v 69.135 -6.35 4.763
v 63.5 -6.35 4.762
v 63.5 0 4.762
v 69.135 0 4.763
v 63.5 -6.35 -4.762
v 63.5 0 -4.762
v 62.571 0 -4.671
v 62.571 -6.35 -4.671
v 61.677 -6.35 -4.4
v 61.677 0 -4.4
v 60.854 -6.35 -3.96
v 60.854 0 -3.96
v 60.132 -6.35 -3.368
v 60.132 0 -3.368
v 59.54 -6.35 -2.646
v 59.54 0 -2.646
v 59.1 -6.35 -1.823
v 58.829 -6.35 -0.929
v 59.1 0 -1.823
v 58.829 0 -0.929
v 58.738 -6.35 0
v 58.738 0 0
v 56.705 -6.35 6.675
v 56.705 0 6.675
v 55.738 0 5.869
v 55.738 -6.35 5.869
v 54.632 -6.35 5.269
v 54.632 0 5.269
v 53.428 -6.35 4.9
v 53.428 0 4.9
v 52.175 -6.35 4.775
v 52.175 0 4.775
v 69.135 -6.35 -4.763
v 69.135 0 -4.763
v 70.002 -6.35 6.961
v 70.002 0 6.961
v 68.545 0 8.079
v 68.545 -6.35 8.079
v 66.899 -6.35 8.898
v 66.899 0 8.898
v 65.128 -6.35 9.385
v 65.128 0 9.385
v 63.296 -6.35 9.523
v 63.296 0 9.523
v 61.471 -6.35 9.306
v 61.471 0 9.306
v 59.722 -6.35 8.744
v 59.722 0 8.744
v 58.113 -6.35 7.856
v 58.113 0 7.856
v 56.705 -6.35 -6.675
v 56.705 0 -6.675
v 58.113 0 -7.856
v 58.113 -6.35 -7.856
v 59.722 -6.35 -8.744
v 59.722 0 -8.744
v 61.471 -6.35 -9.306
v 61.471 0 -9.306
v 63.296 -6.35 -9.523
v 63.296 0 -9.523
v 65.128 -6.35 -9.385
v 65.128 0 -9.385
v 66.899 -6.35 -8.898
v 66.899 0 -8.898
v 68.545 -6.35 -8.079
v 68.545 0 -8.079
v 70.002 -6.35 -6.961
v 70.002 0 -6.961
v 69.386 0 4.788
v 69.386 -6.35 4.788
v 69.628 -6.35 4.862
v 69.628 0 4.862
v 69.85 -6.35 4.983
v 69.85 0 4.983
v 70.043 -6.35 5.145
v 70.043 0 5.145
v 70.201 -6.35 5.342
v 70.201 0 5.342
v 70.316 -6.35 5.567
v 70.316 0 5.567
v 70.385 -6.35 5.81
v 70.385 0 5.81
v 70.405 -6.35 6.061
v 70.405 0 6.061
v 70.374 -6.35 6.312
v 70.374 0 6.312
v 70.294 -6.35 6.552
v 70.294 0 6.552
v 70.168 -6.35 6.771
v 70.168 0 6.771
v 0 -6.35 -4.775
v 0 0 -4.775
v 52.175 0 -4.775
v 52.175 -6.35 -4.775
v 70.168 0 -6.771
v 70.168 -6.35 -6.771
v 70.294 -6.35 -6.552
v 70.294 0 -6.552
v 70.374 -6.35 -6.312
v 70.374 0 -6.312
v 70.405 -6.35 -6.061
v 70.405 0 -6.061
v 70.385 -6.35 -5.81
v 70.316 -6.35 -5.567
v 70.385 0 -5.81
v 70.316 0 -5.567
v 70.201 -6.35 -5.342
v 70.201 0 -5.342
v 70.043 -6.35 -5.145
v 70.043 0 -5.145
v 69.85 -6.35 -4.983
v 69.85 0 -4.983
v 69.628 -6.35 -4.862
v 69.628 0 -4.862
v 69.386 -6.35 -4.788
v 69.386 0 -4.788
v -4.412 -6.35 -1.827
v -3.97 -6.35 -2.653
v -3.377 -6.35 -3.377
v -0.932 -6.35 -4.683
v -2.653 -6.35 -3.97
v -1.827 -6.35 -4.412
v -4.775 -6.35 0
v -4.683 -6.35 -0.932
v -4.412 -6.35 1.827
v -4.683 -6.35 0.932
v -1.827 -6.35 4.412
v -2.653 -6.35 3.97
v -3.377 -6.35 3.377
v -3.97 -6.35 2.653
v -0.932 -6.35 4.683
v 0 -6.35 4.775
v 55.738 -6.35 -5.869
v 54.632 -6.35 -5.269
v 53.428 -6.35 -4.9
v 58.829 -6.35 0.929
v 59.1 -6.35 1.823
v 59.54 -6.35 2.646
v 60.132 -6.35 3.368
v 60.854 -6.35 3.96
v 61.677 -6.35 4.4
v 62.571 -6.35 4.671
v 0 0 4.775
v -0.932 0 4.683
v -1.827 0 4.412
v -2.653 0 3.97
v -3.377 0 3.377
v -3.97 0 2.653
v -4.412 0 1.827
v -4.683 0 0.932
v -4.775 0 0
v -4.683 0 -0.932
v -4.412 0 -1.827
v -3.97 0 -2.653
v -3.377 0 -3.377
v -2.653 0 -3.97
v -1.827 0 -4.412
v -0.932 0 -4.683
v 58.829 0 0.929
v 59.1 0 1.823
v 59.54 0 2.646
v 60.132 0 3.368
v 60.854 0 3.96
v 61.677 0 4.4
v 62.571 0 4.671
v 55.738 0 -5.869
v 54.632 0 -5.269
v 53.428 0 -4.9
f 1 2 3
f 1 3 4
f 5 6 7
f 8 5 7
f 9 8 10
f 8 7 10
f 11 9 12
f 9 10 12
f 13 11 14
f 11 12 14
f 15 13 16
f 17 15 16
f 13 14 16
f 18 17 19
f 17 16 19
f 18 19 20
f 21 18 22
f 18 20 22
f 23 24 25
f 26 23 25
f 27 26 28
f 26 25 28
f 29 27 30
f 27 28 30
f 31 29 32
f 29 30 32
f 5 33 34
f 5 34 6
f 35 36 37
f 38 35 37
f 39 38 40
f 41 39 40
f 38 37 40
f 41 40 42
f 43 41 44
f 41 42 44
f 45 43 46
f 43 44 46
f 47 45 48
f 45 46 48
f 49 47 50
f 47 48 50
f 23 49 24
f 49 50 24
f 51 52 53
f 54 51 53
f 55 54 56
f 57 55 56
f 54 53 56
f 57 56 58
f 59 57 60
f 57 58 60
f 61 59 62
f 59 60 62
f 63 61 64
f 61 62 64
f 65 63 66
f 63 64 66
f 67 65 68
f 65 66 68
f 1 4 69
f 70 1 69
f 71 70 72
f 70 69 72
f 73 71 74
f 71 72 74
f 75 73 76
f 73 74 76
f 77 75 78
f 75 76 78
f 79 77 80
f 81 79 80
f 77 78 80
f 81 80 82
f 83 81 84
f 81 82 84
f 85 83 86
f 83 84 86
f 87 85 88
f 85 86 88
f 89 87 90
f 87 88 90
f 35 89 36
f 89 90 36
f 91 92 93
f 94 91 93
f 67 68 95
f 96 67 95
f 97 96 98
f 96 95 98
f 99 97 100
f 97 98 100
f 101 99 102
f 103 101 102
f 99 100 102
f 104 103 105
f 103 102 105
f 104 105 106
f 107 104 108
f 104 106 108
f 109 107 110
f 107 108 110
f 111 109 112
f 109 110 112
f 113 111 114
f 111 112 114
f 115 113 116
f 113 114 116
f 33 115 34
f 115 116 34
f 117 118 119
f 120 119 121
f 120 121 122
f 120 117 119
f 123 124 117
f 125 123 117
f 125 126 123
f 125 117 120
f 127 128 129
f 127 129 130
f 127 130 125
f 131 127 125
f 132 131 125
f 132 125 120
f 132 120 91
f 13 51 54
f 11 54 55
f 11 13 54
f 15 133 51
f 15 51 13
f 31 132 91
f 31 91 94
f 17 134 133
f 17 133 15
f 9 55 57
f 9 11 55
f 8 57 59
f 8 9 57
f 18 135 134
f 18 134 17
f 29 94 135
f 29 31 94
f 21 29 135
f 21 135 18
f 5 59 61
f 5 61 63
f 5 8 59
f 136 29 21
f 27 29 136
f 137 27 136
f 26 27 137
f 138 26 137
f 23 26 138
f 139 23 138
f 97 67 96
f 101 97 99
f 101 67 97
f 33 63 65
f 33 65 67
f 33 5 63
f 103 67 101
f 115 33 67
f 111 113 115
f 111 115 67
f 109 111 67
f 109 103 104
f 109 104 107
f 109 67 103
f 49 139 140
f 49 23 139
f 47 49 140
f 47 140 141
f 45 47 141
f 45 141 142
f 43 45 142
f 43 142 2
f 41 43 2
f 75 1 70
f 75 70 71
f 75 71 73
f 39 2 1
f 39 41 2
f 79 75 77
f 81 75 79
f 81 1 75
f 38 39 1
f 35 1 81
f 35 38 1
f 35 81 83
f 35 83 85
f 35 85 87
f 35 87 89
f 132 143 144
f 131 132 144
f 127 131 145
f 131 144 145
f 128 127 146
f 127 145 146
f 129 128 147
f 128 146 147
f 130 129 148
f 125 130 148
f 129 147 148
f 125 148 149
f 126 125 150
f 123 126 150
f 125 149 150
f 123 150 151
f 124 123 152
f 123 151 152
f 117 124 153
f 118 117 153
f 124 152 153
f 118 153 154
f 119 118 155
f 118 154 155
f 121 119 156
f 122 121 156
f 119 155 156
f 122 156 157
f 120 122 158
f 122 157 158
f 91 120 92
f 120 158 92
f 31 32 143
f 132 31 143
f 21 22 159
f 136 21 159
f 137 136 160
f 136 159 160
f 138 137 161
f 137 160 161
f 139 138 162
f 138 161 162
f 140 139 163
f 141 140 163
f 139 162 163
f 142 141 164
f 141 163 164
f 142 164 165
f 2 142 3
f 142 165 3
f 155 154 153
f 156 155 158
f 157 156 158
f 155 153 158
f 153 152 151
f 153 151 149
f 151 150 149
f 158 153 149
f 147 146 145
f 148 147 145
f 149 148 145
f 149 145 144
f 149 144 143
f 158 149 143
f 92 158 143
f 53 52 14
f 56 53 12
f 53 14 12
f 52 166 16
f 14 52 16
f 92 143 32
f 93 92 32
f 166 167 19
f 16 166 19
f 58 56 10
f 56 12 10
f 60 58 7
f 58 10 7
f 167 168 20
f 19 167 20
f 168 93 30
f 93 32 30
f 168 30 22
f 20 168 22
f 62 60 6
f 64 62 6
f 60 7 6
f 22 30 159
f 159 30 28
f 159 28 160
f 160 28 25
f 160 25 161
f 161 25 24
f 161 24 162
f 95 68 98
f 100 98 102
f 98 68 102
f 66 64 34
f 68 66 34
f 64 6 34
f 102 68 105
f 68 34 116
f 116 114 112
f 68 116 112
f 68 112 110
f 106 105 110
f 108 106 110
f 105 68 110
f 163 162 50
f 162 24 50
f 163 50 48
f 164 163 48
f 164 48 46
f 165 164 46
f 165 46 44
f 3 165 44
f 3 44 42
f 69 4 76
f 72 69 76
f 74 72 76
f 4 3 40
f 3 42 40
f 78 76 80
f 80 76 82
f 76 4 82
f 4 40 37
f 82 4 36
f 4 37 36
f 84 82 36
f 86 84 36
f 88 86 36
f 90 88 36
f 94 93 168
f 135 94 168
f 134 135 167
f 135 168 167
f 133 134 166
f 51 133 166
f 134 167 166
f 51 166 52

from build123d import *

# Parameters (mm, degrees)
F1_DEPTH = 6.35


with BuildPart() as f1:
    # F0 (on Front) → F1 (new body)
    with BuildSketch(Plane.XZ):
        with BuildLine():
            Line((52.175445, 4.7752), (0, 4.7752))
            ThreePointArc((0, 4.7752), (-4.7752, 0), (0, -4.7752))
            Line((0, -4.7752), (52.175445, -4.7752))
            ThreePointArc((52.175445, -4.7752), (54.631508, -5.269412), (56.705267, -6.67512))
            ThreePointArc((56.705267, -6.67512), (63.295562, -9.522806), (70.001999, -6.960577))
            ThreePointArc((70.001999, -6.960577), (70.316497, -5.566537), (69.135066, -4.7625))
            Line((69.135066, -4.7625), (63.5, -4.7625))
            ThreePointArc((63.5, -4.7625), (60.132404, -3.367596), (58.7375, 0))
            ThreePointArc((58.7375, 0), (60.132404, 3.367596), (63.5, 4.7625))
            Line((63.5, 4.7625), (69.135066, 4.7625))
            ThreePointArc((69.135066, 4.7625), (70.316497, 5.566537), (70.001999, 6.960577))
            ThreePointArc((70.001999, 6.960577), (63.295562, 9.522806), (56.705267, 6.67512))
            ThreePointArc((56.705267, 6.67512), (54.631508, 5.269412), (52.175445, 4.7752))
        make_face()
    extrude(amount=F1_DEPTH)


solid = f1.part
